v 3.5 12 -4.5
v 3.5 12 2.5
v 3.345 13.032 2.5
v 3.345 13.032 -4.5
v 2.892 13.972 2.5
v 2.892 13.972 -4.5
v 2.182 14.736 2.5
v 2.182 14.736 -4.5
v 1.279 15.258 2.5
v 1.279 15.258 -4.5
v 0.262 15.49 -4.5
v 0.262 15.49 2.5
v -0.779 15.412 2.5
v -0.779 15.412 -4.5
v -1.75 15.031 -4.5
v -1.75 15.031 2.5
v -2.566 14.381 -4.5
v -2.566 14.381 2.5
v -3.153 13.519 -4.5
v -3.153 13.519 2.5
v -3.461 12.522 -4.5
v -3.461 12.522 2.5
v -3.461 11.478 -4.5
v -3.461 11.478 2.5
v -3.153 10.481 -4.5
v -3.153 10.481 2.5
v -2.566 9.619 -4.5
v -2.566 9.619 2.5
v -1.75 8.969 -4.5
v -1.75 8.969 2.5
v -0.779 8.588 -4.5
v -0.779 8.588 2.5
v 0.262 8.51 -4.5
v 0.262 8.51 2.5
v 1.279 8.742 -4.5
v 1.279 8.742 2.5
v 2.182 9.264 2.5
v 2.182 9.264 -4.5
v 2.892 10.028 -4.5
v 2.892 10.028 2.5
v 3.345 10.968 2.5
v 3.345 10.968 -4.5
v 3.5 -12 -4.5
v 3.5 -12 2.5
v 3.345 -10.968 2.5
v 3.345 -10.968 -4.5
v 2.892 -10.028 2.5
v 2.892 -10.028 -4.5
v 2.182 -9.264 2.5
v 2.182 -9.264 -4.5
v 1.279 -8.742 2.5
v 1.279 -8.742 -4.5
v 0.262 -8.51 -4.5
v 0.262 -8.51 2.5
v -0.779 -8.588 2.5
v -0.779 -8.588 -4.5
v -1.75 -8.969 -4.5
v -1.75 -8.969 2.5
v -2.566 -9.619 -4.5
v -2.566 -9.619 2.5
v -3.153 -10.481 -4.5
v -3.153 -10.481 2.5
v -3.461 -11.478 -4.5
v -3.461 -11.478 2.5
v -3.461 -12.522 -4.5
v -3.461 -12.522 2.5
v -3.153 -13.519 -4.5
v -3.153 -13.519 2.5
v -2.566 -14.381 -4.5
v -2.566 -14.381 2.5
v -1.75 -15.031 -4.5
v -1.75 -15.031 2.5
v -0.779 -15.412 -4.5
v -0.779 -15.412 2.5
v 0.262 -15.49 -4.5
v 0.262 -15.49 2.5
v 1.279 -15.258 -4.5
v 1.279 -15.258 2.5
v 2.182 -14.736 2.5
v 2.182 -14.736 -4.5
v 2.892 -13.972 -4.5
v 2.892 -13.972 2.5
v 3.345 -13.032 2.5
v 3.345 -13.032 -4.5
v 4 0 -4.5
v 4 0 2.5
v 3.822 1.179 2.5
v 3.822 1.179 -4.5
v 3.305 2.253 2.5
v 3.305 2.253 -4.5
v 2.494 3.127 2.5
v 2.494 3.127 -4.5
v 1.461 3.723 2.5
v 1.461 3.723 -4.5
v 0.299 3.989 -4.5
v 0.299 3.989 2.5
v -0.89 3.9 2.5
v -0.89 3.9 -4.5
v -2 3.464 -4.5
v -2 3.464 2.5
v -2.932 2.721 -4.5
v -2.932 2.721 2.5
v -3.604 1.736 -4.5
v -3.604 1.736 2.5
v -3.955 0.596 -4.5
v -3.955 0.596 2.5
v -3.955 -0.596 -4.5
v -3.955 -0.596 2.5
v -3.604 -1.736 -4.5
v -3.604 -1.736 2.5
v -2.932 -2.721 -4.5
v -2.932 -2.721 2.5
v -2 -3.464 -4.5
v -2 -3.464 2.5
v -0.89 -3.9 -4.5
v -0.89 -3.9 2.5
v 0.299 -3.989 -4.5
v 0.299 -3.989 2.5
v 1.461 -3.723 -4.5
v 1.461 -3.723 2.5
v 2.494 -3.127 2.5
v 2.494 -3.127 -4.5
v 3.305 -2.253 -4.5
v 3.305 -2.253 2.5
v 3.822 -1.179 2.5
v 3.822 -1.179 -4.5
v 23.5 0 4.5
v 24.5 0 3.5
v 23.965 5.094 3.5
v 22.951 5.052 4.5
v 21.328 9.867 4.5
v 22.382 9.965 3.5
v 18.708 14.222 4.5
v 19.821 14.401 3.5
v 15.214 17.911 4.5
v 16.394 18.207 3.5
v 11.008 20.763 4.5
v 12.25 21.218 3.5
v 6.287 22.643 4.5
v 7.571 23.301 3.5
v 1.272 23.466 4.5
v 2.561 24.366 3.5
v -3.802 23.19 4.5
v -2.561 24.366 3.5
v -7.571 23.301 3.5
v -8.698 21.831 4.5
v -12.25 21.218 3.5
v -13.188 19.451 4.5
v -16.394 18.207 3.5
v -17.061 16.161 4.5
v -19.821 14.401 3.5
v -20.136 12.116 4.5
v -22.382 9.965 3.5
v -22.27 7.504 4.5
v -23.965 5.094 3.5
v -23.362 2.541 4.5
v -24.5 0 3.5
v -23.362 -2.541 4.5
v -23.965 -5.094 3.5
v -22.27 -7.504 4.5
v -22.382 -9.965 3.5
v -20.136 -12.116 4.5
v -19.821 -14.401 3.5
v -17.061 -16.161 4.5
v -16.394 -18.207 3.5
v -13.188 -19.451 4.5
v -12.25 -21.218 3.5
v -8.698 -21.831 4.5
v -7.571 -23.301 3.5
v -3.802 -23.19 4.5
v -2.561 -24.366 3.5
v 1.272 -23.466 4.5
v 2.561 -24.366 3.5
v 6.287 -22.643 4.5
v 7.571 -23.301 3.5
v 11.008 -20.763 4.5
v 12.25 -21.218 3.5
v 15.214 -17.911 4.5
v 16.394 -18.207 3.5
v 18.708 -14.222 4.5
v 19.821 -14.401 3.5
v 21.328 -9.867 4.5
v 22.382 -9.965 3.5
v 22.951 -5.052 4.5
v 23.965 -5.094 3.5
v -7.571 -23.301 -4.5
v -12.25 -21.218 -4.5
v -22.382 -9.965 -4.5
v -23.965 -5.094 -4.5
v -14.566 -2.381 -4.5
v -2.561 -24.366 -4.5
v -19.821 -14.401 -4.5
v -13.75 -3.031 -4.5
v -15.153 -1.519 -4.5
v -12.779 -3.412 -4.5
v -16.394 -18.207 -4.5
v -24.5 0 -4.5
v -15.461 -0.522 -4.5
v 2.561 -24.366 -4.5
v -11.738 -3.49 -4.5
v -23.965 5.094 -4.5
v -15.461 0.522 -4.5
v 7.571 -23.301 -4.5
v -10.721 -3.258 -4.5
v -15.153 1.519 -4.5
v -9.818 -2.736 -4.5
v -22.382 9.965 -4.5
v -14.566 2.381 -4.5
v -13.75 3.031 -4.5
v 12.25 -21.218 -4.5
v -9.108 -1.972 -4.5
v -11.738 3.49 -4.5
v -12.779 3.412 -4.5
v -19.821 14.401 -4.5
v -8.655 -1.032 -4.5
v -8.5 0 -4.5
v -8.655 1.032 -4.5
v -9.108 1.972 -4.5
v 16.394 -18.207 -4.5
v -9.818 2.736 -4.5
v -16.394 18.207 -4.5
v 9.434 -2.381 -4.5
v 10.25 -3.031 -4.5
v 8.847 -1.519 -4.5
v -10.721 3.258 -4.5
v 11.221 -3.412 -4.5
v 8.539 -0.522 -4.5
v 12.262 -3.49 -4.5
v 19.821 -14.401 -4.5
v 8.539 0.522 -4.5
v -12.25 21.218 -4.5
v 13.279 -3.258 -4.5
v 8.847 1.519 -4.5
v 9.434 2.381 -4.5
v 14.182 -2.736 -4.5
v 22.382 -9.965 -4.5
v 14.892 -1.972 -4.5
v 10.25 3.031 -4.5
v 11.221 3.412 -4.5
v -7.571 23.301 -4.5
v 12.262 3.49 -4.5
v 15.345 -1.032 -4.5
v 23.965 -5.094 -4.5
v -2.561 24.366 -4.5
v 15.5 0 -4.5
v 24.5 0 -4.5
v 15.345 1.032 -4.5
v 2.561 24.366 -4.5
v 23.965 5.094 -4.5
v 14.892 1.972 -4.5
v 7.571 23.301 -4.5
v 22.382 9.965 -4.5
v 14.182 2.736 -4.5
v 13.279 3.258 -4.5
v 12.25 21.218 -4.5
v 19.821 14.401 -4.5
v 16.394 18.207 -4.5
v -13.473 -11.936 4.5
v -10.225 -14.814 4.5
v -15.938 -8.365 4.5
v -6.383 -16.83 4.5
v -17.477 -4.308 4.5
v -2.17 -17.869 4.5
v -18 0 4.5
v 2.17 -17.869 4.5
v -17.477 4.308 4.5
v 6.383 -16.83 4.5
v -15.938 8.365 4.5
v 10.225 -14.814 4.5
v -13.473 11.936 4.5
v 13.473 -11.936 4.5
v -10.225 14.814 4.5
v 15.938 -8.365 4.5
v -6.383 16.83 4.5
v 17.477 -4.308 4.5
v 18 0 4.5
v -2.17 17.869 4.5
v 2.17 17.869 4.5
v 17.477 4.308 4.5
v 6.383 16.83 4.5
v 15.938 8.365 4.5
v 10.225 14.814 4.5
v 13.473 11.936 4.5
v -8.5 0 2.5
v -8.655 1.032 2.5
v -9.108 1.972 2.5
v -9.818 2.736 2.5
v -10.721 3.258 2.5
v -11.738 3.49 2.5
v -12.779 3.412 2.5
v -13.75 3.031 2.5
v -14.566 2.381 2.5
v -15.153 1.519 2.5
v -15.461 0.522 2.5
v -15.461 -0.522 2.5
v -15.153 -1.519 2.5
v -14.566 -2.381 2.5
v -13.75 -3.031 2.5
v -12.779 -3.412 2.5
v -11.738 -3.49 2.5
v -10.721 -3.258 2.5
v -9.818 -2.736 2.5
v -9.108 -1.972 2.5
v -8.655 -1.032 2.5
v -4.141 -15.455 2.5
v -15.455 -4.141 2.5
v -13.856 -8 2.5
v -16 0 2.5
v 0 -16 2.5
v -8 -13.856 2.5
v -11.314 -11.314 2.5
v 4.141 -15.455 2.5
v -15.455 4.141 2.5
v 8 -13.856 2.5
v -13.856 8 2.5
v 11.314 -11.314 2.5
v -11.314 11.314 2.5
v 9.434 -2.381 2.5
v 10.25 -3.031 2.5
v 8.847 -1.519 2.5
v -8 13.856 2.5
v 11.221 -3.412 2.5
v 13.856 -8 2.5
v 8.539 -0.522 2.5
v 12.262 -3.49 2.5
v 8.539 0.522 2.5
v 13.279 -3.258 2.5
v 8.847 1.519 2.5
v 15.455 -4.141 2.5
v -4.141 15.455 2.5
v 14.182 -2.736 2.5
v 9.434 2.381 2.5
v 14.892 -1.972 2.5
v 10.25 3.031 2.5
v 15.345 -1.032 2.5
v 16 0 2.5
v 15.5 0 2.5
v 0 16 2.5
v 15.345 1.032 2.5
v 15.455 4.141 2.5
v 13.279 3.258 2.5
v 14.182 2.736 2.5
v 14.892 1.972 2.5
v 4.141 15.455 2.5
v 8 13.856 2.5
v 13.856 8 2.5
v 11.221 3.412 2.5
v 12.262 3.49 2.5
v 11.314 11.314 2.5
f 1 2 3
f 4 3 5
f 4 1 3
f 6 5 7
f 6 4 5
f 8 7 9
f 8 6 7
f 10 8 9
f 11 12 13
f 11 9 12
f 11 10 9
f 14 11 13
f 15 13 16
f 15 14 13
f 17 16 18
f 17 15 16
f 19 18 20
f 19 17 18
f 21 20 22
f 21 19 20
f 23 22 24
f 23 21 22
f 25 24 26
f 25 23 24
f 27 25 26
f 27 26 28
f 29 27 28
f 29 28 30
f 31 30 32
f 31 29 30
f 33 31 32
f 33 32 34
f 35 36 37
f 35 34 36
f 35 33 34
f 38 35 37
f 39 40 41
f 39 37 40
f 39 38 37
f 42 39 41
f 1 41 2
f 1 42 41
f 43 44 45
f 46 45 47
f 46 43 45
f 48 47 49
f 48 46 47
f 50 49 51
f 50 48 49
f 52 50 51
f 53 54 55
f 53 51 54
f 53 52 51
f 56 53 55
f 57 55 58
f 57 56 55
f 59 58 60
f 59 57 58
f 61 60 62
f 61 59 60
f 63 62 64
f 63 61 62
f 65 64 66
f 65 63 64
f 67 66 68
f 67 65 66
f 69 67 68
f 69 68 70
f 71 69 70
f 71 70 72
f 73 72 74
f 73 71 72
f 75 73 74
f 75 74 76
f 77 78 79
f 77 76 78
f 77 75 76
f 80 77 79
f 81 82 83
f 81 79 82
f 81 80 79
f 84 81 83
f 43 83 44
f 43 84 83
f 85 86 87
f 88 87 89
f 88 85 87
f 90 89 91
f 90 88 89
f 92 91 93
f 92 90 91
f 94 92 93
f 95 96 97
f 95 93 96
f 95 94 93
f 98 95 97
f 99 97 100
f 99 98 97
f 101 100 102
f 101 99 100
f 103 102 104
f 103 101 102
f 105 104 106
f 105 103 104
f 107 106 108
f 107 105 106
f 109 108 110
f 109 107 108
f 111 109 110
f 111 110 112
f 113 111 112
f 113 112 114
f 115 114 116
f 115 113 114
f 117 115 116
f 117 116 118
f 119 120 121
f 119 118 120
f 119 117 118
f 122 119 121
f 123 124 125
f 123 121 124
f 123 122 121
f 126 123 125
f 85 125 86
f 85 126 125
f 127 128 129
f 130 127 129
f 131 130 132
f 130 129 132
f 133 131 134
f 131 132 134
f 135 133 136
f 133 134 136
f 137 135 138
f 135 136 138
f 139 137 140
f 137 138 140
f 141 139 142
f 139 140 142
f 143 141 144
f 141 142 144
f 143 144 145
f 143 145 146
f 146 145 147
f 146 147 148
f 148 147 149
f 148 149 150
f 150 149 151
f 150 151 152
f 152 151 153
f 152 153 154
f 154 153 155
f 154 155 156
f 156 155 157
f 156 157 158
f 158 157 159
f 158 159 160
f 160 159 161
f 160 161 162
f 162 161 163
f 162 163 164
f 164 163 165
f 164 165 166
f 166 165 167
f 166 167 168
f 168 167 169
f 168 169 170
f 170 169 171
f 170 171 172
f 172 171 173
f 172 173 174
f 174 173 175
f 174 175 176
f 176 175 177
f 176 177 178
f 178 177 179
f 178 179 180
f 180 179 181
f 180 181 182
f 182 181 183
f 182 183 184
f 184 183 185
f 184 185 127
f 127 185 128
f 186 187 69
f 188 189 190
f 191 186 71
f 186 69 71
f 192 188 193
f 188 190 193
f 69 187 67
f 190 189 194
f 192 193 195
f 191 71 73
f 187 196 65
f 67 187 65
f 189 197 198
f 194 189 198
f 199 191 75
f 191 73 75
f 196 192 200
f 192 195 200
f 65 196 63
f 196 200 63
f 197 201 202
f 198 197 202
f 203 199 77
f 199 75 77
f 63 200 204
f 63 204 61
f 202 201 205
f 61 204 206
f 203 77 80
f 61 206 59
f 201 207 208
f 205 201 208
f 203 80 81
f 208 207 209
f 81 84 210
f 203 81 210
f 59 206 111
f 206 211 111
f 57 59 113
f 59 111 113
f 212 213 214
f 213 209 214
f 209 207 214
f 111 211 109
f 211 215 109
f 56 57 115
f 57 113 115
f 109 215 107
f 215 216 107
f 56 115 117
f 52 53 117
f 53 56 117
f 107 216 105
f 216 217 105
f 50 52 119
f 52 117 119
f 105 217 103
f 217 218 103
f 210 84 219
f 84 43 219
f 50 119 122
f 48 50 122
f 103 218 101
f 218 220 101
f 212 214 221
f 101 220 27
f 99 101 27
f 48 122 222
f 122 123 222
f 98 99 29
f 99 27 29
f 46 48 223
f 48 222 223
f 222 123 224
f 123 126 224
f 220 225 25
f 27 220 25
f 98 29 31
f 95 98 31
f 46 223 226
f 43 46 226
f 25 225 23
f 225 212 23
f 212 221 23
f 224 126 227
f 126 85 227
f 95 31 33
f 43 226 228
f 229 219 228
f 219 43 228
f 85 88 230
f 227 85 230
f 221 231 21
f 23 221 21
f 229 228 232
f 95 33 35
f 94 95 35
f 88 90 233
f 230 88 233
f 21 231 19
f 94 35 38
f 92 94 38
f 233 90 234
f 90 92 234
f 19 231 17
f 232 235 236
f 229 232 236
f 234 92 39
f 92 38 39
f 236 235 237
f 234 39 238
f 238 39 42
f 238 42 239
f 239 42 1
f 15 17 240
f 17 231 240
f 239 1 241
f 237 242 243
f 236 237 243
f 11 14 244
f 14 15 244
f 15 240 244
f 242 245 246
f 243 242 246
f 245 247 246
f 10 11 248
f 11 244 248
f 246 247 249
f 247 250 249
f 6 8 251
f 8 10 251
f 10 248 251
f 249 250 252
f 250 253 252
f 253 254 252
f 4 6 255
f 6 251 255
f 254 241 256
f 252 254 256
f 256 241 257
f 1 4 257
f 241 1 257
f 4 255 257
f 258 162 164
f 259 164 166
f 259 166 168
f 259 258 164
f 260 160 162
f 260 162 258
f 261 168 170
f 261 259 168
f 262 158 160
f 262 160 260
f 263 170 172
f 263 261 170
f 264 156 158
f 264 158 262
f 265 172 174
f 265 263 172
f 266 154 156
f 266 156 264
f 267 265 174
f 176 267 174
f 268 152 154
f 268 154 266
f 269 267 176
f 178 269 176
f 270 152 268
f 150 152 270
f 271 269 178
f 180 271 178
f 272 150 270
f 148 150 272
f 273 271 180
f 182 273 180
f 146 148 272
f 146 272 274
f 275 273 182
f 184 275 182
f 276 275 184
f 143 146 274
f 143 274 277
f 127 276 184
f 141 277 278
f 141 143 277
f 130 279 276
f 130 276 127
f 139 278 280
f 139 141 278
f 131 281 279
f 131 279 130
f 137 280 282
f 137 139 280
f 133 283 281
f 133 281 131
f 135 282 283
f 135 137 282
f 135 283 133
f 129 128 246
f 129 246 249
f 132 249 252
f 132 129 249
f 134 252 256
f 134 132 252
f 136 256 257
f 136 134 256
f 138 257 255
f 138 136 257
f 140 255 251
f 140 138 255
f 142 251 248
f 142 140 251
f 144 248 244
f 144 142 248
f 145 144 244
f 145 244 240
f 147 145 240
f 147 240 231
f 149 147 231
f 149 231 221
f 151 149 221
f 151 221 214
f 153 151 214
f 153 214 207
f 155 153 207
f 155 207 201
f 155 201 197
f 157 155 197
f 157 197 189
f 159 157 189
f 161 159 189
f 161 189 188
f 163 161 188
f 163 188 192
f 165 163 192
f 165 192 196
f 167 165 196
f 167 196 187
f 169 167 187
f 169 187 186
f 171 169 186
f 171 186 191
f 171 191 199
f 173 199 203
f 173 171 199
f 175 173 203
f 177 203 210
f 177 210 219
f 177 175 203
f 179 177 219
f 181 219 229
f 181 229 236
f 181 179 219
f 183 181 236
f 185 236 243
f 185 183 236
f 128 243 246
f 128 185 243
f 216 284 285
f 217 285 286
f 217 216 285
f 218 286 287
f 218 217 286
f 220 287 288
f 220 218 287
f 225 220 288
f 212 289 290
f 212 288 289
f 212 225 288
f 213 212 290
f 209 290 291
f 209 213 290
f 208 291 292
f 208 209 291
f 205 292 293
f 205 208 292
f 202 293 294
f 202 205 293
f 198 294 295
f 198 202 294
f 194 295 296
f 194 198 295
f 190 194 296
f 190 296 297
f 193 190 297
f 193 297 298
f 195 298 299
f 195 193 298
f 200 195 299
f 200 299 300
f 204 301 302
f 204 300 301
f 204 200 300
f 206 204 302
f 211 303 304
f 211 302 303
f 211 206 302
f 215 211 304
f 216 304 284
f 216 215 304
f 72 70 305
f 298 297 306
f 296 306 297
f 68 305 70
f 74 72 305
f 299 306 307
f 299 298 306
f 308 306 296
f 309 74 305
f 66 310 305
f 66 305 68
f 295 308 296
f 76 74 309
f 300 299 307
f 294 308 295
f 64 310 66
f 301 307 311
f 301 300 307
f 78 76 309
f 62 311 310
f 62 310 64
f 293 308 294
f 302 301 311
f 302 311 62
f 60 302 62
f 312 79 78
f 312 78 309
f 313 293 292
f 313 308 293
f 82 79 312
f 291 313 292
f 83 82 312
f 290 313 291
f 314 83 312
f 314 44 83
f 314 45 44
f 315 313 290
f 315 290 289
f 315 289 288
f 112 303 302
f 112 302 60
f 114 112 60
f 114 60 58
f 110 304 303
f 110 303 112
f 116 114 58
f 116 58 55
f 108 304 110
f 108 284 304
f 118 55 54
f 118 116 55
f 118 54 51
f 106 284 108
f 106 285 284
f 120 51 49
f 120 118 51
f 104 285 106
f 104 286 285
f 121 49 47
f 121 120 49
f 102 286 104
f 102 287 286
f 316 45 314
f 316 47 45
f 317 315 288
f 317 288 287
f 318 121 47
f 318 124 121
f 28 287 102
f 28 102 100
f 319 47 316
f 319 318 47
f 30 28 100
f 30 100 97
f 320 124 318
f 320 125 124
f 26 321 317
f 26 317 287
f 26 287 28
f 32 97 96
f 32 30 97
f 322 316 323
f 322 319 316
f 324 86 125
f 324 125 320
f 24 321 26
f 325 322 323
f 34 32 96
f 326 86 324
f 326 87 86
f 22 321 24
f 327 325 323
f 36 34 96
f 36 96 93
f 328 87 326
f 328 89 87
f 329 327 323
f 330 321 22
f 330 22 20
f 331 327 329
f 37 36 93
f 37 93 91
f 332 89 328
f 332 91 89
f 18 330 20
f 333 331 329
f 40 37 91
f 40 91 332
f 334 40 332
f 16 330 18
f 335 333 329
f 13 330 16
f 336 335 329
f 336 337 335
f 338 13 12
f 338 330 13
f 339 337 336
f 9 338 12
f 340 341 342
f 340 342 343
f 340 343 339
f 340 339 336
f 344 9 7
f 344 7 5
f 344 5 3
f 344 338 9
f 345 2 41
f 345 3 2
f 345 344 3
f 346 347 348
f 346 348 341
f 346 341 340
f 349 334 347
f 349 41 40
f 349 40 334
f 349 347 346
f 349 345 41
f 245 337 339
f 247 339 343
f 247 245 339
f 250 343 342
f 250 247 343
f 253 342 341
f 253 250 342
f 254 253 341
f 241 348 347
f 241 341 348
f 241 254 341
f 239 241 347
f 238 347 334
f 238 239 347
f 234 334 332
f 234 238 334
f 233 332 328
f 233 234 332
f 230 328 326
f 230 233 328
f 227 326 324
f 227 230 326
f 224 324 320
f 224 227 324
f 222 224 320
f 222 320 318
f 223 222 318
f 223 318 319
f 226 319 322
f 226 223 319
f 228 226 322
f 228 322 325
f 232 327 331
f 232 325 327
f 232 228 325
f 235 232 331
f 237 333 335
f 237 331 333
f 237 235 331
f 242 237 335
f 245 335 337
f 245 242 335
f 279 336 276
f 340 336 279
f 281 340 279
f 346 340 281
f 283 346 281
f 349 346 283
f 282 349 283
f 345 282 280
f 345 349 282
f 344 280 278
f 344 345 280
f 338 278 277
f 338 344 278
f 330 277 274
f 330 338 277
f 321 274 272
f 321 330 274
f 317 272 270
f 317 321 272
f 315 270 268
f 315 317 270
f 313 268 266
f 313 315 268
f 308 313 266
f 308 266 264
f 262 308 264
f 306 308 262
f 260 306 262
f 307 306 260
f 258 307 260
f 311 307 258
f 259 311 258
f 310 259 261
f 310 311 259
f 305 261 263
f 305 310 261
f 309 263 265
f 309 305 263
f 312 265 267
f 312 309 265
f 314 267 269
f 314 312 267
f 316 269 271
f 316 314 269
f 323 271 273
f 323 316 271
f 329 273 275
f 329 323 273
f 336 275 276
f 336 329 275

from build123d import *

# Parameters (mm, degrees)
SKETCH1_R           = 24.5
SKETCH1_R_2         = 3.5
SKETCH1_R_3         = 4
BOSS_EXTRUDE1_DEPTH = 4.5
SKETCH2_R           = 16
CUT_EXTRUDE1_DEPTH  = 2
CHAMFER1_SIZE       = 2
CHAMFER2_SIZE       = 1


with BuildPart() as part:
    # Sketch1 → Boss-Extrude1 (new, symmetric)
    with BuildSketch(Plane.XY):
        Circle(SKETCH1_R)
        with Locations((0, 12)):
            Circle(SKETCH1_R_2, mode=Mode.SUBTRACT)
        with Locations((-12, 0)):
            Circle(SKETCH1_R_2, mode=Mode.SUBTRACT)
        with Locations((0, -12)):
            Circle(SKETCH1_R_2, mode=Mode.SUBTRACT)
        with Locations((12, 0)):
            Circle(SKETCH1_R_2, mode=Mode.SUBTRACT)
        Circle(SKETCH1_R_3, mode=Mode.SUBTRACT)
    extrude(amount=BOSS_EXTRUDE1_DEPTH, both=True)

    # Sketch2 → Cut-Extrude1 (cut)
    with BuildSketch(Plane.XY.offset(4.5)):
        Circle(SKETCH2_R)
    extrude(amount=-CUT_EXTRUDE1_DEPTH, mode=Mode.SUBTRACT)

    # Chamfer1
    chamfer1_edges = [part.edges().sort_by_distance(p)[0] for p in [
        (-16, 0, 4.5),
    ]]
    chamfer(chamfer1_edges, length=CHAMFER1_SIZE - 0.0001)  # a hair under: the kernel refuses the full size

    # Chamfer2
    chamfer2_edges = [part.edges().sort_by_distance(p)[0] for p in [
        (-24.5, 0, 4.5),
    ]]
    chamfer(chamfer2_edges, length=CHAMFER2_SIZE)


solid = part.part
